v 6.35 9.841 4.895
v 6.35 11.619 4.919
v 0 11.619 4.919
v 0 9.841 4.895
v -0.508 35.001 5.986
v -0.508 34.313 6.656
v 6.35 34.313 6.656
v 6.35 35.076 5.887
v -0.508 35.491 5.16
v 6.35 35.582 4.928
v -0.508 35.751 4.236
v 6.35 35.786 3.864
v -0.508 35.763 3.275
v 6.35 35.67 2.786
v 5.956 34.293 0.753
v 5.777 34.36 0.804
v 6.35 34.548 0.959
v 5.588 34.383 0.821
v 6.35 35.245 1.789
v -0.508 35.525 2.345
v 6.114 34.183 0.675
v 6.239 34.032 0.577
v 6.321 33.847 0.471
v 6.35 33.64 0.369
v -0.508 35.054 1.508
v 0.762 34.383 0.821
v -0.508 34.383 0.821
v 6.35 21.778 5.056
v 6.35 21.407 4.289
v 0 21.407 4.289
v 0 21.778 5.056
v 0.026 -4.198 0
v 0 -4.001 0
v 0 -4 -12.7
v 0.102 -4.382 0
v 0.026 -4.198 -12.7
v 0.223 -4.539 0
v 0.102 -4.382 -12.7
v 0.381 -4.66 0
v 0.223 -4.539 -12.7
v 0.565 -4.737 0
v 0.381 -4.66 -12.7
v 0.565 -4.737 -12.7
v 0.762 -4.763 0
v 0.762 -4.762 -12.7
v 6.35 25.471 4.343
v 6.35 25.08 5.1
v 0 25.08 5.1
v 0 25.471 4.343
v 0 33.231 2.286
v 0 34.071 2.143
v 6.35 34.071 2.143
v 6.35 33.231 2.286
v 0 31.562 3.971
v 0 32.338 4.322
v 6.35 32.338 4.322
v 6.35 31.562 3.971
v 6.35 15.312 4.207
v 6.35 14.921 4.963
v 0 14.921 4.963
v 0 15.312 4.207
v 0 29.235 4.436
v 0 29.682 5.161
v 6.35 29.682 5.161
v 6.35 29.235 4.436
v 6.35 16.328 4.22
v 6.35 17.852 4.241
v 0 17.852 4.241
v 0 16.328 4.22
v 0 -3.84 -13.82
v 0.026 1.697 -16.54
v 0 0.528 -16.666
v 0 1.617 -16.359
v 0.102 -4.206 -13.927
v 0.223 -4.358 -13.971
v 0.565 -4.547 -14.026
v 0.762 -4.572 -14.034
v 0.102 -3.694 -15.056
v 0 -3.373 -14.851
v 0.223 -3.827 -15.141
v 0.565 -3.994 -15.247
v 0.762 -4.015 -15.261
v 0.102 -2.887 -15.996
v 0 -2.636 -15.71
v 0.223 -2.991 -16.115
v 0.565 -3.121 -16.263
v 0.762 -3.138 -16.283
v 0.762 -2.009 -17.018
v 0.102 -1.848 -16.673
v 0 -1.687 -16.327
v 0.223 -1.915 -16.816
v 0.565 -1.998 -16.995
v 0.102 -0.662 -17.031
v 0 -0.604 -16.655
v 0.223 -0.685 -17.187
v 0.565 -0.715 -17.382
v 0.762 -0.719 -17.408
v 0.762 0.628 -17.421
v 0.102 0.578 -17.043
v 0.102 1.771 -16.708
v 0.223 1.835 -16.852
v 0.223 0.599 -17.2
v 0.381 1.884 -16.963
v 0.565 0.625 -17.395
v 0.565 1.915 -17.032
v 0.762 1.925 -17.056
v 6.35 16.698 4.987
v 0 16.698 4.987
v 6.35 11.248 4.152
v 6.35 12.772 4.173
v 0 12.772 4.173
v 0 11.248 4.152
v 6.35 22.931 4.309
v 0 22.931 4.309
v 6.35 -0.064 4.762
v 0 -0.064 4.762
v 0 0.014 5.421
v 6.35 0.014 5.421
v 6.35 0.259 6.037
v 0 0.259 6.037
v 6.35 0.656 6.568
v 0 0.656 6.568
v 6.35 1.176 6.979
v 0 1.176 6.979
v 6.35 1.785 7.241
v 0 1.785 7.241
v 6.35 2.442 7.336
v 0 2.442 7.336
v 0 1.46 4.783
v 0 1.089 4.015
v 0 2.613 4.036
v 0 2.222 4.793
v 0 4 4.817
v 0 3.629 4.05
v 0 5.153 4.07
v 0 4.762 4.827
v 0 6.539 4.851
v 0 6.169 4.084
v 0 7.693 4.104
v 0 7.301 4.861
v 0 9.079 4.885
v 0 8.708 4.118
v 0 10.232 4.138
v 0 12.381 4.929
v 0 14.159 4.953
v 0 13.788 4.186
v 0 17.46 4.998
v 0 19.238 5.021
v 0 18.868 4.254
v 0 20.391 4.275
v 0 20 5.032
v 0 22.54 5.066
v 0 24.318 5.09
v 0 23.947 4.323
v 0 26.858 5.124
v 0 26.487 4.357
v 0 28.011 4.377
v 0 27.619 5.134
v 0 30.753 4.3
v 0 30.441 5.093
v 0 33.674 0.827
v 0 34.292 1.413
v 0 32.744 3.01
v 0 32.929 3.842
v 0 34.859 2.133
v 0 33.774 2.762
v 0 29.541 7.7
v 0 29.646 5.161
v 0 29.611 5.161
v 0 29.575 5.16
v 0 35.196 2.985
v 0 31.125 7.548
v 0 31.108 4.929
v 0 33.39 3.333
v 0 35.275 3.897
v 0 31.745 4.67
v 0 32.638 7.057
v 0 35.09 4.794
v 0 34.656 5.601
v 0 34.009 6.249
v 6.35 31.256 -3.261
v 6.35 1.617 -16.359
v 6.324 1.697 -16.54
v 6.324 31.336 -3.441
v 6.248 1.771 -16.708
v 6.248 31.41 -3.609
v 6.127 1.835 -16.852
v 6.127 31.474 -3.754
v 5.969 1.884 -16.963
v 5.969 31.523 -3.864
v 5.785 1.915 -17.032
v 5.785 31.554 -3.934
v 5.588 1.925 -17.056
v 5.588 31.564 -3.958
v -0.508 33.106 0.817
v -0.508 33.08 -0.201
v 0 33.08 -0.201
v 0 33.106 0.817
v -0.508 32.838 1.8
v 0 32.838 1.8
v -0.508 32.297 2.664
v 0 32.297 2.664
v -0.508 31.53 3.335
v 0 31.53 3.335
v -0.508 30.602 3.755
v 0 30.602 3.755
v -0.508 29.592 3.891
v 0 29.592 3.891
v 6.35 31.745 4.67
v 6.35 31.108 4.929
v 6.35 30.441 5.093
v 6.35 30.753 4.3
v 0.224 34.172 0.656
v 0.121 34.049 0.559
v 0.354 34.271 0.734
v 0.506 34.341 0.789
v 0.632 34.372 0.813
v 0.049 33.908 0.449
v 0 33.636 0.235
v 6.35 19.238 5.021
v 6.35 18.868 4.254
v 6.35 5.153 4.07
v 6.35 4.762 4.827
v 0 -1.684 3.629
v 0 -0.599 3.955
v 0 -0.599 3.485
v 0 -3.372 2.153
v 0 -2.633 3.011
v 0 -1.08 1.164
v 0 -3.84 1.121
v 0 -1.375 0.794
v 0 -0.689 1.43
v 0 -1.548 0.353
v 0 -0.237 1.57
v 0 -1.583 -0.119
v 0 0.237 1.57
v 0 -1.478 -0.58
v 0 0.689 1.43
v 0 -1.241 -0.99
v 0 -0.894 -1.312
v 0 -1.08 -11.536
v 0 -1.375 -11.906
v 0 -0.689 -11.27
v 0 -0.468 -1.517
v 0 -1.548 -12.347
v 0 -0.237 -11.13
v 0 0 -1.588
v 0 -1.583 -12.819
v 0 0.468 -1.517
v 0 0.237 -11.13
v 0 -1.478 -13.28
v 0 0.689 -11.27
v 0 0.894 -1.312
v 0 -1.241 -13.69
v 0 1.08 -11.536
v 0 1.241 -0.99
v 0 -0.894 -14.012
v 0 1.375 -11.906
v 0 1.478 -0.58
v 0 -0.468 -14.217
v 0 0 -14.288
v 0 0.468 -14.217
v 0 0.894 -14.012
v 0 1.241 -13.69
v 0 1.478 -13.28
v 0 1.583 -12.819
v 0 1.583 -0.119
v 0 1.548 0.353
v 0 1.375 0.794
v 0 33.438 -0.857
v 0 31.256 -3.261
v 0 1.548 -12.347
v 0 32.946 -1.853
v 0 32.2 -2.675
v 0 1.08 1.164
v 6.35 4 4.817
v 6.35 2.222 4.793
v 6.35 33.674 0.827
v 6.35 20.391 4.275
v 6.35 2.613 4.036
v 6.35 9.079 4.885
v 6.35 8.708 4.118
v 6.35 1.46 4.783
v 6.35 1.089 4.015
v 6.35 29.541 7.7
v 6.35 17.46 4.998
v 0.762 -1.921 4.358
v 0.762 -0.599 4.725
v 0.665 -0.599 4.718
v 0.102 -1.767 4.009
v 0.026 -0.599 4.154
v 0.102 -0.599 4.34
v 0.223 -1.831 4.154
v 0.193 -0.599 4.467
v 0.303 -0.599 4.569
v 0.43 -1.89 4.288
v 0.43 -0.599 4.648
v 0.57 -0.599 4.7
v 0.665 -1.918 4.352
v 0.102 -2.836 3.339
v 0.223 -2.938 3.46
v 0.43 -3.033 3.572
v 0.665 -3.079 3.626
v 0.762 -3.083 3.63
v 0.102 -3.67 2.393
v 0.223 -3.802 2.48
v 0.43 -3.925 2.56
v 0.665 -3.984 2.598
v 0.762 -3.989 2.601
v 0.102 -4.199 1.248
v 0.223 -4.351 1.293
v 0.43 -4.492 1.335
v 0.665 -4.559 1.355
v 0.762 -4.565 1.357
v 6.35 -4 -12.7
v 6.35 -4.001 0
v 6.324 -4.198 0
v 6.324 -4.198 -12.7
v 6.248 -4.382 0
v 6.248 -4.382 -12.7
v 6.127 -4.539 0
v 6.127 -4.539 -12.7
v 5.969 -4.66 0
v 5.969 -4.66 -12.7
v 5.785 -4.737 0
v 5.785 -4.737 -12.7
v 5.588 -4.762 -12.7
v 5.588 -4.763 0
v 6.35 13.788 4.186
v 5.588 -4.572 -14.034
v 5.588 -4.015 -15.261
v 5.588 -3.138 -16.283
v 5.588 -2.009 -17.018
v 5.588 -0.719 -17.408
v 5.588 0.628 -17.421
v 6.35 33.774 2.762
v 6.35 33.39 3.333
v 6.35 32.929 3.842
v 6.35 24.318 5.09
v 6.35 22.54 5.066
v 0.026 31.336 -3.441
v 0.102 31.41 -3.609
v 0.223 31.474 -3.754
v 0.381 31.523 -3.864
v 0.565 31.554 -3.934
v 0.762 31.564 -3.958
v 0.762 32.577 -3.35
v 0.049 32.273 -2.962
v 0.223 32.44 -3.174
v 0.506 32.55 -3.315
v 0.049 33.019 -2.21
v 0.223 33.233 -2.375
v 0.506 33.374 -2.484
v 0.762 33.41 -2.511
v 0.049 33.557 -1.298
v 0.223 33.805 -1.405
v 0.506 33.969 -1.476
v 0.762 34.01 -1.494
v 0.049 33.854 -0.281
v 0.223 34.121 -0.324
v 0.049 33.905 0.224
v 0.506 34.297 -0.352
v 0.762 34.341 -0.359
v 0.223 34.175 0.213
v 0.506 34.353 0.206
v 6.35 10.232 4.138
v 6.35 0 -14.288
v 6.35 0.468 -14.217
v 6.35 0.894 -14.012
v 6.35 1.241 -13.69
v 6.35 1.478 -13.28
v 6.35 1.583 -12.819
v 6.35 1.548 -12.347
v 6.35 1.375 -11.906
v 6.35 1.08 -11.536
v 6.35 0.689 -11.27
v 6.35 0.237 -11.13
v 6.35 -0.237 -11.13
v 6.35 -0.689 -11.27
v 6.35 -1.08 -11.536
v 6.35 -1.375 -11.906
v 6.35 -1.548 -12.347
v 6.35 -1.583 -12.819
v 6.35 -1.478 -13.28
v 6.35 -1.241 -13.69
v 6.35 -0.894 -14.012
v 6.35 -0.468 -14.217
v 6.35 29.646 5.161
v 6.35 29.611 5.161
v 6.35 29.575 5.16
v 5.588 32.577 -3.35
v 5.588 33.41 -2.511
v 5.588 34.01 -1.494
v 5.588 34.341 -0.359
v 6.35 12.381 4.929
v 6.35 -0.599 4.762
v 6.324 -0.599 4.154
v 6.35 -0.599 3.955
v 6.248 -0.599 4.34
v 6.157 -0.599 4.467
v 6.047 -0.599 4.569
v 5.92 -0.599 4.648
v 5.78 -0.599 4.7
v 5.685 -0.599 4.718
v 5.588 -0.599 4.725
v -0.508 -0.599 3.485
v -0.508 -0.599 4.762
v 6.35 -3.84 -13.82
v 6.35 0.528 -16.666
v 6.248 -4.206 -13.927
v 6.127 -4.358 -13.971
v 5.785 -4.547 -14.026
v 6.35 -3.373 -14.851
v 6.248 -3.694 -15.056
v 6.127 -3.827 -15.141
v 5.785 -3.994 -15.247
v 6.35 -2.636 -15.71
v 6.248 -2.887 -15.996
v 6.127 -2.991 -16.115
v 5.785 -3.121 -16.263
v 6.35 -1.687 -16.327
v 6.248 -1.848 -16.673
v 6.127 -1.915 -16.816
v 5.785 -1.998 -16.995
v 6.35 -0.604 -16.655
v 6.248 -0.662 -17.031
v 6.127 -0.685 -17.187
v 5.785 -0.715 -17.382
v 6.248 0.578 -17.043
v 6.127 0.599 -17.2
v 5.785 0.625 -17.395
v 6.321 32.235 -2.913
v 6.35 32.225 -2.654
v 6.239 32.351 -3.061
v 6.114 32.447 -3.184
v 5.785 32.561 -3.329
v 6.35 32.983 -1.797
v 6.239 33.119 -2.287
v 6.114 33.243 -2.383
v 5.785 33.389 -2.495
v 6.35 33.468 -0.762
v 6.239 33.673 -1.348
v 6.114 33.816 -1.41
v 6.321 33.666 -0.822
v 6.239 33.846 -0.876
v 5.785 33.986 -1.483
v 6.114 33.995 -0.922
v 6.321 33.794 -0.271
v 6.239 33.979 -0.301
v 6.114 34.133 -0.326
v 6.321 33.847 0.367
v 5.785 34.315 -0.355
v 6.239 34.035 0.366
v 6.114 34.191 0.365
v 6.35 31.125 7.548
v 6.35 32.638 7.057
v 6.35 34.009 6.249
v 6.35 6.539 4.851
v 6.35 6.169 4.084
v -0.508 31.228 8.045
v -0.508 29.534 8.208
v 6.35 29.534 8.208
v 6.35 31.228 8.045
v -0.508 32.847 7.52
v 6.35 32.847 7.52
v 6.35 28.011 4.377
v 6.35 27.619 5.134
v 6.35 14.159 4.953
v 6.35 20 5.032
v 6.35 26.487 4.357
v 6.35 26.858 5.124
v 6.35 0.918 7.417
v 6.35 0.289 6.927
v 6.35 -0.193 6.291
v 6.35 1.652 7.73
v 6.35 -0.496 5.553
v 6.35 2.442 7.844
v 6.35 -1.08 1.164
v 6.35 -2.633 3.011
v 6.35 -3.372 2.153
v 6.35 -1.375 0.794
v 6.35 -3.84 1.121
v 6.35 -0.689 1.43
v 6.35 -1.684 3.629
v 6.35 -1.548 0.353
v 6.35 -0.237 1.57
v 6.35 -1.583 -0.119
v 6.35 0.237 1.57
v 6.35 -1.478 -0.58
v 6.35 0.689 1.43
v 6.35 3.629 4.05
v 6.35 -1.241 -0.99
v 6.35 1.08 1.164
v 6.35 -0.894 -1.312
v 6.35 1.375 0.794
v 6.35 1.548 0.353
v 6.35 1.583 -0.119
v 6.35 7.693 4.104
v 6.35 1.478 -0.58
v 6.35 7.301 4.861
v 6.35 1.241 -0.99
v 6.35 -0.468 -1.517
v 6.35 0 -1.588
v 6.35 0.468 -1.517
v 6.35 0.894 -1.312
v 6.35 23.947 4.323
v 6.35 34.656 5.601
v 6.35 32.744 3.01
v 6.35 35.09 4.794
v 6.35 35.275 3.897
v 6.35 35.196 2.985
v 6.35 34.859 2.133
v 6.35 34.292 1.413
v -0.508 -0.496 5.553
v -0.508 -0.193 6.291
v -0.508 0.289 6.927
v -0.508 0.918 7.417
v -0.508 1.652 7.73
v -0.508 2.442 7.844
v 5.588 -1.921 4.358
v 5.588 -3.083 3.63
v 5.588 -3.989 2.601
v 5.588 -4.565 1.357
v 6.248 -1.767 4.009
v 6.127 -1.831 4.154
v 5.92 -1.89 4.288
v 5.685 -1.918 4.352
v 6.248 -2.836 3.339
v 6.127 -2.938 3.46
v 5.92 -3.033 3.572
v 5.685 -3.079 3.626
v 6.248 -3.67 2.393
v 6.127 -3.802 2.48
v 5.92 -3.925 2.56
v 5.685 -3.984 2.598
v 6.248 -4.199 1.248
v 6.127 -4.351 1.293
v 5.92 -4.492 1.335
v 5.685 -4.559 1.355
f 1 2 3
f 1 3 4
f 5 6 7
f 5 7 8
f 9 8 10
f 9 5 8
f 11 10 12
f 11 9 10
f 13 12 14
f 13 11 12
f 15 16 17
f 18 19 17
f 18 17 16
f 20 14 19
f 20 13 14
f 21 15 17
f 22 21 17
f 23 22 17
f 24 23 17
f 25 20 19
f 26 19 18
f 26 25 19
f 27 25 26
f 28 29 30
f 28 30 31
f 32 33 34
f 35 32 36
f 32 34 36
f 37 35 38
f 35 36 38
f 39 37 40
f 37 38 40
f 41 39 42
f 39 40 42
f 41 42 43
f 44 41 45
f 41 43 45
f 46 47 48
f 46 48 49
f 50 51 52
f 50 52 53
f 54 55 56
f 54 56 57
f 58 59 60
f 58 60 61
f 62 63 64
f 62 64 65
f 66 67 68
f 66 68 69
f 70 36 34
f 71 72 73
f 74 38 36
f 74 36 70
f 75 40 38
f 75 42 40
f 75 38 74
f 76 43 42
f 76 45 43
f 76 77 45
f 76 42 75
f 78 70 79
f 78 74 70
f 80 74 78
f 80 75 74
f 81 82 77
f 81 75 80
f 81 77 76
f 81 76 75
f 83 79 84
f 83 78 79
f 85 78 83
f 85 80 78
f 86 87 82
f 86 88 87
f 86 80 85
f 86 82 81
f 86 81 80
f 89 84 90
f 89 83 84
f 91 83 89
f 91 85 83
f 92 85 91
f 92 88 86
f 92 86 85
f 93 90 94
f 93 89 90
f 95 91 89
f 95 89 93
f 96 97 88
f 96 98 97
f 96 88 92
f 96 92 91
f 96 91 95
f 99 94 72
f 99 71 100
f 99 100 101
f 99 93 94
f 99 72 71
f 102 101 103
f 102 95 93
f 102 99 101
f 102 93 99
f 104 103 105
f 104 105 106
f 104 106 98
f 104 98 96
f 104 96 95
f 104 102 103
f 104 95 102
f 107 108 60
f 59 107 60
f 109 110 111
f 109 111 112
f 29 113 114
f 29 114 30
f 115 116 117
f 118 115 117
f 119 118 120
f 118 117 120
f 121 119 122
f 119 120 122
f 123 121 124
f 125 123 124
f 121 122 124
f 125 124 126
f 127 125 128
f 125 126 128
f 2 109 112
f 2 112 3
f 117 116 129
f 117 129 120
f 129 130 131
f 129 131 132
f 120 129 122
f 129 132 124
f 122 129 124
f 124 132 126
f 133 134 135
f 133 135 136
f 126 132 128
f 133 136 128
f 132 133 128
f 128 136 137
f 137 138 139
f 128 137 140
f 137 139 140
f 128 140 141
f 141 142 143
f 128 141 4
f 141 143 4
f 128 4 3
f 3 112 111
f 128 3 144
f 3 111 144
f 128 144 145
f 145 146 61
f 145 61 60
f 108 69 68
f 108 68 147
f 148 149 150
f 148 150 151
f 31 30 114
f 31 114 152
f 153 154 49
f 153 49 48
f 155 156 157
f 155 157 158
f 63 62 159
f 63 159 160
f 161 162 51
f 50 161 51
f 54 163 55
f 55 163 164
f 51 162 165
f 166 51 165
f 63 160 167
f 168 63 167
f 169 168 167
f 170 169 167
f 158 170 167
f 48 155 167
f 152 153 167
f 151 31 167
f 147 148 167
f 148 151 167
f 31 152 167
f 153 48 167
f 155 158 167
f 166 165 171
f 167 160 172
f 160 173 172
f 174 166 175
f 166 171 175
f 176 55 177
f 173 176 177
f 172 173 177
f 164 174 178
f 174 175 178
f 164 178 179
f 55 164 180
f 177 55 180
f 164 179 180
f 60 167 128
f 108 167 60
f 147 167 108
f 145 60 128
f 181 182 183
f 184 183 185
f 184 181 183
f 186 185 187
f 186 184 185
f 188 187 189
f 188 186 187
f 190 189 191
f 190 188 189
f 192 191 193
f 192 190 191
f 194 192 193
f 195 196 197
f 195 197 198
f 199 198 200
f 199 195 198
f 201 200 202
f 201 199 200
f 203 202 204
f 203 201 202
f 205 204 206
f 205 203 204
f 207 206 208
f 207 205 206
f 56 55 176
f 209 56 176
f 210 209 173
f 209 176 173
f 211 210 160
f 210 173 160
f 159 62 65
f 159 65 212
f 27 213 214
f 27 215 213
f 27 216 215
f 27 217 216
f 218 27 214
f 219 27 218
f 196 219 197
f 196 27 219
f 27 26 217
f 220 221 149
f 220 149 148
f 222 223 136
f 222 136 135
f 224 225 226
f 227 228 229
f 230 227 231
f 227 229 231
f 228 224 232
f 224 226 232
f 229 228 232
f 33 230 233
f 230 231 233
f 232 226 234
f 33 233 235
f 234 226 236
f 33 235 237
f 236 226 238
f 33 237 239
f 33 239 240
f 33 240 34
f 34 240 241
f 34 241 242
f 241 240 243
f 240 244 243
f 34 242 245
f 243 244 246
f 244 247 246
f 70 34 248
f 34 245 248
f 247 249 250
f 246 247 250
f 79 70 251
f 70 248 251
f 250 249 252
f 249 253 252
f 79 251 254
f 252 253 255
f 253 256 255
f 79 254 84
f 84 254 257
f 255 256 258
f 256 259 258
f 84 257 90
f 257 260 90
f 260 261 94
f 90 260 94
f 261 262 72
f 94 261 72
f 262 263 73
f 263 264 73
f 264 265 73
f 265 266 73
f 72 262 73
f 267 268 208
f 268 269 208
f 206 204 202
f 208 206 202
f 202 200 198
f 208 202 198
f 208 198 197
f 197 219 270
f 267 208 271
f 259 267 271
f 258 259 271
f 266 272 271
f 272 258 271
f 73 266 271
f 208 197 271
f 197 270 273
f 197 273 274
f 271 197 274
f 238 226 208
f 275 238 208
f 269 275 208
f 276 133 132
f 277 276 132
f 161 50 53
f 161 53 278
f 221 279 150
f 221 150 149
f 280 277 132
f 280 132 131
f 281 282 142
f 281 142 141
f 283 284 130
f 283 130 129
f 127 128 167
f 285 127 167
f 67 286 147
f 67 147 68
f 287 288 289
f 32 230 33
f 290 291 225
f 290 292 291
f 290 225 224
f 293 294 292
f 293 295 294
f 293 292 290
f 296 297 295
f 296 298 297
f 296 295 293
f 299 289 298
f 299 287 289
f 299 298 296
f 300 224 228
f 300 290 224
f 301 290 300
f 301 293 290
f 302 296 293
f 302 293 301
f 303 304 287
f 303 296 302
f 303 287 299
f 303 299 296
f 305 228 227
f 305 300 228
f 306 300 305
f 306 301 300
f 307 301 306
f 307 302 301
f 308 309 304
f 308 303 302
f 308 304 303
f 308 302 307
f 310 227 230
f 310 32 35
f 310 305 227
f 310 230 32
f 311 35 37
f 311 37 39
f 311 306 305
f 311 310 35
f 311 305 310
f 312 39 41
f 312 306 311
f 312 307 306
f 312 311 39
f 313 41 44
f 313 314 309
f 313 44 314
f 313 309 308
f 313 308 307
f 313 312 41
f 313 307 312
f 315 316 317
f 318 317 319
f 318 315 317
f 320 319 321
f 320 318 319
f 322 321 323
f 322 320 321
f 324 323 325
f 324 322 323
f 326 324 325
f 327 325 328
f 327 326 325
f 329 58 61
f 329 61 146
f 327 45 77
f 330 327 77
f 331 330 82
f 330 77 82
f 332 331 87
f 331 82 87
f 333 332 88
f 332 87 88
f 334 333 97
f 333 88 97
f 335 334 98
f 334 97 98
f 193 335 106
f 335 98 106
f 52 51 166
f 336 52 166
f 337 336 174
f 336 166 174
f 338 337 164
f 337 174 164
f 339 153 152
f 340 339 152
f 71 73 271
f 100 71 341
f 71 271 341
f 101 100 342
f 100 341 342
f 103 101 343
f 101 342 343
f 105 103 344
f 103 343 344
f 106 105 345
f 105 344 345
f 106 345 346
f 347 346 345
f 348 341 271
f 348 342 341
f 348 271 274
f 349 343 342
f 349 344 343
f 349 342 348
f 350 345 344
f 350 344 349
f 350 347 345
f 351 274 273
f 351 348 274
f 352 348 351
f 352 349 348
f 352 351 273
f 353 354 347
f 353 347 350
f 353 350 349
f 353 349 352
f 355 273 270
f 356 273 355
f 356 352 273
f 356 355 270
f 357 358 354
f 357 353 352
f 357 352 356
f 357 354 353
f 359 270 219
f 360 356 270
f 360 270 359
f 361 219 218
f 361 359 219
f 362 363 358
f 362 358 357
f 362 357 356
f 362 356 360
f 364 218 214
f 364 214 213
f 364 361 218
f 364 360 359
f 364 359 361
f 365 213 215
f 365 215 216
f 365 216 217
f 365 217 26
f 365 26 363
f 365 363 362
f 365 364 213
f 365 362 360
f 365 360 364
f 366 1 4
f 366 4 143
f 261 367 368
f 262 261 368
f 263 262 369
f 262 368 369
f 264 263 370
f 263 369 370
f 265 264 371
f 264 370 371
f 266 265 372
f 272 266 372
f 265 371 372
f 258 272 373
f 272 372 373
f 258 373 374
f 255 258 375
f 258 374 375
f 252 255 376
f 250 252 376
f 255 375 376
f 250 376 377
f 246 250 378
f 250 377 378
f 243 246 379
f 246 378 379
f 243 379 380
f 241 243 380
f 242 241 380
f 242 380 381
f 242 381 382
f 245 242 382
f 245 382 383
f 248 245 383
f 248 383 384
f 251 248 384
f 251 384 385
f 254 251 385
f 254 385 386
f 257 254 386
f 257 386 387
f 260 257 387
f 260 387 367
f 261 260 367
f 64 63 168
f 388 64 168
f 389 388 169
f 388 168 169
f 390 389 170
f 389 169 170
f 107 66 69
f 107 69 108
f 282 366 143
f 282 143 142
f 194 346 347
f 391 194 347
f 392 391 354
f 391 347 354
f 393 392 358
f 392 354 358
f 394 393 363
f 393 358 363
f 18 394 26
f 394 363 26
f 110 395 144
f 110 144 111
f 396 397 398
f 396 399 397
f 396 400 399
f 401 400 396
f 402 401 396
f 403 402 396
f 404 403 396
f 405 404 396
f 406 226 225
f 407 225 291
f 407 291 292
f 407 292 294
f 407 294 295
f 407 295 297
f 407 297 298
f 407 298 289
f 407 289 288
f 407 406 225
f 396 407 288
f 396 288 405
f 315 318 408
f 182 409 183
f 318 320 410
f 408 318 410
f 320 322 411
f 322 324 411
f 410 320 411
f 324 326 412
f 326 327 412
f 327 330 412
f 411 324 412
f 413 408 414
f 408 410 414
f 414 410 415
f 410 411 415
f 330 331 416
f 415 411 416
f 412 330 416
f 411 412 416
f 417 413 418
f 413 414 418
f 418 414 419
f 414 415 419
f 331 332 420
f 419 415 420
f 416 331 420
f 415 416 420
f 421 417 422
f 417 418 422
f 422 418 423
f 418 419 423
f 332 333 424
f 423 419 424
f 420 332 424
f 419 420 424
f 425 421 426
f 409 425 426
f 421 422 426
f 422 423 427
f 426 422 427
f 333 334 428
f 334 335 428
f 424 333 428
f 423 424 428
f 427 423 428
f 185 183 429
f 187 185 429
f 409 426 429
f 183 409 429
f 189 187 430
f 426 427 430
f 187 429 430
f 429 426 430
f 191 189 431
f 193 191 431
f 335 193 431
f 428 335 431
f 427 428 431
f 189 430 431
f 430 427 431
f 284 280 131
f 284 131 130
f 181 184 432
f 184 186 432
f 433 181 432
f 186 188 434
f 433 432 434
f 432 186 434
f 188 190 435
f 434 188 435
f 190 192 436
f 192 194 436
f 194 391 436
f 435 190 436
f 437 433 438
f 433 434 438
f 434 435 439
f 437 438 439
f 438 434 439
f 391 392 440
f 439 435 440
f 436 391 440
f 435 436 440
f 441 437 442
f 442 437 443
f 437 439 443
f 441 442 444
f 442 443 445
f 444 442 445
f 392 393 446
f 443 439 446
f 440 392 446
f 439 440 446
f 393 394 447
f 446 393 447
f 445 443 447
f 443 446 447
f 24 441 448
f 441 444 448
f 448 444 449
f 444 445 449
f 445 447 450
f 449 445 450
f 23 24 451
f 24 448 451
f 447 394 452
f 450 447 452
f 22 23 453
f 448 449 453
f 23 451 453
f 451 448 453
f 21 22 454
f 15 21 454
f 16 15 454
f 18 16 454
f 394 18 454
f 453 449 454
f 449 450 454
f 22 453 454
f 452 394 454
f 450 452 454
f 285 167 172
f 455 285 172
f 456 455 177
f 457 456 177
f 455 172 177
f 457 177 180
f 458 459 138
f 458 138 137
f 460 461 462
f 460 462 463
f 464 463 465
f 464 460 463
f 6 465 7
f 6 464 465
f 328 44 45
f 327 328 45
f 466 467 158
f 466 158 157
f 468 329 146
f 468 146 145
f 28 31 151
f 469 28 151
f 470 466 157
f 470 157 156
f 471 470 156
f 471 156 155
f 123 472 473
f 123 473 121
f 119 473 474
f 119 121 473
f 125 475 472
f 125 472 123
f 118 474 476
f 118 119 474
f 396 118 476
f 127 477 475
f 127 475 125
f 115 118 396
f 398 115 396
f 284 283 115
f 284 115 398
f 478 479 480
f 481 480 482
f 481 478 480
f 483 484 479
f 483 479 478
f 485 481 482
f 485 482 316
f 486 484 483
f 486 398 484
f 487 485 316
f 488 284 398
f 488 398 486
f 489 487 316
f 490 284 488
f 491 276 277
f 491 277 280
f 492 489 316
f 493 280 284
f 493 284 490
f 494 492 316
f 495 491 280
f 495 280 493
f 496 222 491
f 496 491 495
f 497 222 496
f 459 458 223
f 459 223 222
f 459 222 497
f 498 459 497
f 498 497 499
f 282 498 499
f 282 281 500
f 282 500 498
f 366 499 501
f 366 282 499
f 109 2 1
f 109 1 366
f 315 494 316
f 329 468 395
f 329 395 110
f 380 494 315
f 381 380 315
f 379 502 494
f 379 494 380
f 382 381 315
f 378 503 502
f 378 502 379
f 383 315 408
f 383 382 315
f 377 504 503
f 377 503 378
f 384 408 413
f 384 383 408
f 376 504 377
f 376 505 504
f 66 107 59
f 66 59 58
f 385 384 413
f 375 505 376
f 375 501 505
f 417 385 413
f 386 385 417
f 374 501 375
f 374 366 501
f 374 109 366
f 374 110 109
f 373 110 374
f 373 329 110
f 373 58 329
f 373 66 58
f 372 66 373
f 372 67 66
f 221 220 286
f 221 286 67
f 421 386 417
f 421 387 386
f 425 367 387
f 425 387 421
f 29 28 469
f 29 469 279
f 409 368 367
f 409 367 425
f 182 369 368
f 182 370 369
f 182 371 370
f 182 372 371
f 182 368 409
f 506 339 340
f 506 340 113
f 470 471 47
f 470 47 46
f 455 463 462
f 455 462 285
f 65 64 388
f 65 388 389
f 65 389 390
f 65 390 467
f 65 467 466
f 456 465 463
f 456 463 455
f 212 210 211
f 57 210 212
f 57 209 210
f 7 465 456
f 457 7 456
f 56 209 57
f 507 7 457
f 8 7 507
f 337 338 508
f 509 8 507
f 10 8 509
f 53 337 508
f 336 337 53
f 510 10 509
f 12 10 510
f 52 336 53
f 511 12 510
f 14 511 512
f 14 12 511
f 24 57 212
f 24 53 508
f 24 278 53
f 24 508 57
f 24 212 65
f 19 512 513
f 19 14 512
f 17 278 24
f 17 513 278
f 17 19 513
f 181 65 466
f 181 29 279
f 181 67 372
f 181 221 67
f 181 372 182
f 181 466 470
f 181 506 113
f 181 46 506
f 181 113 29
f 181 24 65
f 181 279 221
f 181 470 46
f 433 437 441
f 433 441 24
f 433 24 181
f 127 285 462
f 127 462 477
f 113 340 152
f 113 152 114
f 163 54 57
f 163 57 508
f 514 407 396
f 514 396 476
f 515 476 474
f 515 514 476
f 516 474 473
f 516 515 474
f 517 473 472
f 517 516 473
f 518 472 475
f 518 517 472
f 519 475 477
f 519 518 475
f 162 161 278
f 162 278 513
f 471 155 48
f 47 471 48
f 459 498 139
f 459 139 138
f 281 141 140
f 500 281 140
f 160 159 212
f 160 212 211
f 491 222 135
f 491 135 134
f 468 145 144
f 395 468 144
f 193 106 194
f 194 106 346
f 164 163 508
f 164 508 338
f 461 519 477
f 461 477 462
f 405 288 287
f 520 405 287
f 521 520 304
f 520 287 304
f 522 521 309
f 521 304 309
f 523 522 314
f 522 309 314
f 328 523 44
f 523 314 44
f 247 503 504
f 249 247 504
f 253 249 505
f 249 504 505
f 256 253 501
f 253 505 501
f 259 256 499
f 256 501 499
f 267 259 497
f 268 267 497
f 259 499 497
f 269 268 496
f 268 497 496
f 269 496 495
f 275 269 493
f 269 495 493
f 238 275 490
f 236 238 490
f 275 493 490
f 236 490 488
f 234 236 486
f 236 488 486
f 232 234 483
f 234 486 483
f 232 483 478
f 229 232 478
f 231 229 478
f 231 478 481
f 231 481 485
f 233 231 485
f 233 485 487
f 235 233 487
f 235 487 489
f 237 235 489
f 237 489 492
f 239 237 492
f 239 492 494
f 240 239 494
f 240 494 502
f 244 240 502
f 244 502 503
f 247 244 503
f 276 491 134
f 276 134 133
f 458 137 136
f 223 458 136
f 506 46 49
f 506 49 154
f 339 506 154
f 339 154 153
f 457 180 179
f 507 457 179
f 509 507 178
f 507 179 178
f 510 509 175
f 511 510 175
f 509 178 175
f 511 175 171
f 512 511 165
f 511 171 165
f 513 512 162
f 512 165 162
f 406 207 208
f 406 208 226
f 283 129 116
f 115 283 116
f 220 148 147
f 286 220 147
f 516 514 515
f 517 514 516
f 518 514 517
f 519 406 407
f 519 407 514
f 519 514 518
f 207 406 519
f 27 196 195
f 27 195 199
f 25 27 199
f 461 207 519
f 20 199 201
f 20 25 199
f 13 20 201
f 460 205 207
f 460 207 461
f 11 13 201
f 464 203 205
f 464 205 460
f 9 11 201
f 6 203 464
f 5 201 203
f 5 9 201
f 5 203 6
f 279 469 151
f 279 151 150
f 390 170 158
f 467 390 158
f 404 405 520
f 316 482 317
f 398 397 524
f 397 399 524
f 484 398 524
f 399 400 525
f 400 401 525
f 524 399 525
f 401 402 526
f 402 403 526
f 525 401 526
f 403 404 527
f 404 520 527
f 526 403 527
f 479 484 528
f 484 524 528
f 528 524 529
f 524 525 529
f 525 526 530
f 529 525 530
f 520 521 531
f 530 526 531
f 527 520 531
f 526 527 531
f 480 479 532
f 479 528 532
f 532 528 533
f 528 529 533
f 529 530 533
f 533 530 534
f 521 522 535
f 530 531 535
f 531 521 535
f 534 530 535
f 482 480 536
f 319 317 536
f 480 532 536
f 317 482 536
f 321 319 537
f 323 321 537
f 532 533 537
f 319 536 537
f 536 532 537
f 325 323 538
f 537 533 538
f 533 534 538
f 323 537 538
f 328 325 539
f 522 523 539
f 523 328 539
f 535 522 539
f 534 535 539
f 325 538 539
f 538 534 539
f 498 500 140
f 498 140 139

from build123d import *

# Parameters (mm, degrees)
BOSS_EXTRUDE1_DEPTH = 6.35
SKETCH2_R           = 1.5875
CUT_EXTRUDE1_DEPTH  = 38.1
CUT_EXTRUDE2_DEPTH  = 6.35
LPATTERN1_COUNT     = 11
LPATTERN1_PITCH     = 2.54
CUT_EXTRUDE3_START  = -6.35
CUT_EXTRUDE3_DEPTH  = 6.35
CIRPATTERN1_COUNT   = 3
CIRPATTERN1_ANGLE   = 68
BOSS_EXTRUDE2_DEPTH = 6.35
BOSS_EXTRUDE3_START = 0.508
BOSS_EXTRUDE3_DEPTH = 0.508
FILLET3_R           = 0.762


with BuildPart() as part:
    # Sketch1 → Boss-Extrude1 (new body)
    with BuildSketch(Plane(origin=(0, 0, 0), x_dir=(0, 0, -1), z_dir=(1, 0, 0))):
        with BuildLine():
            Line((0, -4.7625), (12.7, -4.7625))
            ThreePointArc((12.7, -4.7625), (16.69058737, -2.599349668), (17.05608691, 1.925074826))
            Line((17.05608691, 1.925074826), (3.957741706, 31.564198098))
            ThreePointArc((3.957741706, 31.564198098), (-1.413387908, 34.29219694), (-5.160415138, 29.575121793))
            Line((-5.160415138, 29.575121793), (-4.762069934, -0.064001479))
            ThreePointArc((-4.762069934, -0.064001479), (-3.344891568, -3.39014847), (0, -4.7625))
        make_face()
    extrude(amount=BOSS_EXTRUDE1_DEPTH)

    # Sketch2 → Cut-Extrude1 (cut)
    with BuildSketch(Plane(origin=(6.35, 0, 0), x_dir=(0, 0, -1), z_dir=(1, 0, 0))):
        Circle(SKETCH2_R)
        with Locations((12.7, 0)):
            Circle(SKETCH2_R)
    extrude(amount=-CUT_EXTRUDE1_DEPTH, mode=Mode.SUBTRACT)

    # Sketch3 → Cut-Extrude2 (cut)
    with BuildSketch(Plane(origin=(6.35, 0, 0), x_dir=(0, 0, -1), z_dir=(1, 0, 0))):
        Polygon((-4.782550408, 1.4598609), (-4.792790644, 2.22179209), (-4.035979573, 2.612997921), (-4.0154991, 1.089135542), align=None)
    cut_extrude2 = extrude(amount=-CUT_EXTRUDE2_DEPTH, mode=Mode.SUBTRACT)

    # LPattern1: Cut-Extrude2 ×11
    with Locations(*[Vector(0, 0.9999096975250266, 0.013438630711869543) * (i * LPATTERN1_PITCH) for i in range(1, LPATTERN1_COUNT)]):
        add(cut_extrude2, mode=Mode.SUBTRACT)

    # Sketch5 → Cut-Extrude3 (cut)
    with BuildSketch(Plane(origin=(6.35, 0, 0), x_dir=(0, 0, -1), z_dir=(1, 0, 0)).offset(CUT_EXTRUDE3_START)):
        with BuildLine():
            Line((-2.14250095, 34.070751301), (-2.285611832, 33.230915438))
            Line((-2.285611832, 33.230915438), (-0.827385747, 33.673806717))
            Line((-0.827385747, 33.673806717), (-1.413387908, 34.29219694))
            ThreePointArc((-1.413387908, 34.29219694), (-1.782380451, 34.196079788), (-2.14250095, 34.070751301))
        make_face()
    cut_extrude3 = extrude(amount=CUT_EXTRUDE3_DEPTH, mode=Mode.SUBTRACT)

    # CirPattern1: Cut-Extrude3 ×3 about axis
    cirpattern1_axis = Axis((0, 29.639123272, 0.398345204), (1, 0, 0))
    for i in range(1, CIRPATTERN1_COUNT):
        add(cut_extrude3.rotate(cirpattern1_axis, i * CIRPATTERN1_ANGLE / (CIRPATTERN1_COUNT - 1)), mode=Mode.SUBTRACT)

    # Sketch6 → Boss-Extrude2 (add)
    with BuildSketch(Plane(origin=(0, 0, 0), x_dir=(0, 0, -1), z_dir=(1, 0, 0))):
        with BuildLine():
            Line((-7.335974688, 2.441635031), (-7.70018577, 29.540987671))
            ThreePointArc((-7.70018577, 29.540987671), (-7.343715671, 31.89485715), (-6.249061464, 34.008977446))
            ThreePointArc((-6.249061464, 34.008977446), (-3.897096462, 35.275278165), (-1.413387908, 34.29219694))
            ThreePointArc((-1.413387908, 34.29219694), (-1.118769293, 34.346818609), (-0.821298902, 34.382805009))
            ThreePointArc((-0.821298902, 34.382805009), (-3.75592559, 35.788432355), (-6.656067812, 34.312967301))
            ThreePointArc((-6.656067812, 34.312967301), (-7.826871877, 32.051777768), (-8.208139896, 29.534160847))
            Line((-8.208139896, 29.534160847), (-7.844020566, 2.441635031))
            ThreePointArc((-7.844020566, 2.441635031), (-6.92684089, 0.288995326), (-4.762069934, -0.599172997))
            Line((-4.762069934, -0.599172997), (-4.724658503, -0.599172997))
            ThreePointArc((-4.724658503, -0.599172997), (-4.750905835, -0.332114438), (-4.762069934, -0.064001479))
            ThreePointArc((-4.762069934, -0.064001479), (-6.567956624, 0.655743647), (-7.335974688, 2.441635031))
        make_face()
    extrude(amount=BOSS_EXTRUDE2_DEPTH)

    # Sketch7 → Boss-Extrude3 (add)
    with BuildSketch(Plane.ZY.offset(BOSS_EXTRUDE3_START)):
        with BuildLine():
            Line((3.890529822, 29.592188854), (3.484762618, -0.599172997))
            Line((3.484762618, -0.599172997), (4.762069934, -0.599172997))
            ThreePointArc((4.762069934, -0.599172997), (6.92684089, 0.288995326), (7.844020566, 2.441635031))
            Line((7.844020566, 2.441635031), (8.208139896, 29.534160847))
            ThreePointArc((8.208139896, 29.534160847), (7.826871877, 32.051777768), (6.656067812, 34.312967301))
            ThreePointArc((6.656067812, 34.312967301), (3.75592559, 35.788432355), (0.821298902, 34.382805009))
            Line((0.821298902, 34.382805009), (-0.201439925, 33.079735725))
            ThreePointArc((-0.201439925, 33.079735725), (2.663789861, 32.297189628), (3.890529822, 29.592188854))
        make_face()
    extrude(amount=-BOSS_EXTRUDE3_DEPTH)

    # Fillet3
    fillet3_edges = [part.edges().sort_by_distance(p)[0] for p in [
        (6.35, -2.599349668, -16.69058737),
        (6.35, 16.744636462, -10.506914308),
        (6.35, 33.741303888, -2.021059773),
        (0, -3.573161601, 3.148638186),
        (6.35, -3.573161601, 3.148638186),
        (0, 33.741303888, -2.021059773),
        (0, 16.744636462, -10.506914308),
        (6.35, -4.7625, -6.35),
        (0, -2.599349668, -16.69058737),
        (0, -4.7625, -6.35),
    ]]
    fillet(fillet3_edges, radius=FILLET3_R)


solid = part.part
